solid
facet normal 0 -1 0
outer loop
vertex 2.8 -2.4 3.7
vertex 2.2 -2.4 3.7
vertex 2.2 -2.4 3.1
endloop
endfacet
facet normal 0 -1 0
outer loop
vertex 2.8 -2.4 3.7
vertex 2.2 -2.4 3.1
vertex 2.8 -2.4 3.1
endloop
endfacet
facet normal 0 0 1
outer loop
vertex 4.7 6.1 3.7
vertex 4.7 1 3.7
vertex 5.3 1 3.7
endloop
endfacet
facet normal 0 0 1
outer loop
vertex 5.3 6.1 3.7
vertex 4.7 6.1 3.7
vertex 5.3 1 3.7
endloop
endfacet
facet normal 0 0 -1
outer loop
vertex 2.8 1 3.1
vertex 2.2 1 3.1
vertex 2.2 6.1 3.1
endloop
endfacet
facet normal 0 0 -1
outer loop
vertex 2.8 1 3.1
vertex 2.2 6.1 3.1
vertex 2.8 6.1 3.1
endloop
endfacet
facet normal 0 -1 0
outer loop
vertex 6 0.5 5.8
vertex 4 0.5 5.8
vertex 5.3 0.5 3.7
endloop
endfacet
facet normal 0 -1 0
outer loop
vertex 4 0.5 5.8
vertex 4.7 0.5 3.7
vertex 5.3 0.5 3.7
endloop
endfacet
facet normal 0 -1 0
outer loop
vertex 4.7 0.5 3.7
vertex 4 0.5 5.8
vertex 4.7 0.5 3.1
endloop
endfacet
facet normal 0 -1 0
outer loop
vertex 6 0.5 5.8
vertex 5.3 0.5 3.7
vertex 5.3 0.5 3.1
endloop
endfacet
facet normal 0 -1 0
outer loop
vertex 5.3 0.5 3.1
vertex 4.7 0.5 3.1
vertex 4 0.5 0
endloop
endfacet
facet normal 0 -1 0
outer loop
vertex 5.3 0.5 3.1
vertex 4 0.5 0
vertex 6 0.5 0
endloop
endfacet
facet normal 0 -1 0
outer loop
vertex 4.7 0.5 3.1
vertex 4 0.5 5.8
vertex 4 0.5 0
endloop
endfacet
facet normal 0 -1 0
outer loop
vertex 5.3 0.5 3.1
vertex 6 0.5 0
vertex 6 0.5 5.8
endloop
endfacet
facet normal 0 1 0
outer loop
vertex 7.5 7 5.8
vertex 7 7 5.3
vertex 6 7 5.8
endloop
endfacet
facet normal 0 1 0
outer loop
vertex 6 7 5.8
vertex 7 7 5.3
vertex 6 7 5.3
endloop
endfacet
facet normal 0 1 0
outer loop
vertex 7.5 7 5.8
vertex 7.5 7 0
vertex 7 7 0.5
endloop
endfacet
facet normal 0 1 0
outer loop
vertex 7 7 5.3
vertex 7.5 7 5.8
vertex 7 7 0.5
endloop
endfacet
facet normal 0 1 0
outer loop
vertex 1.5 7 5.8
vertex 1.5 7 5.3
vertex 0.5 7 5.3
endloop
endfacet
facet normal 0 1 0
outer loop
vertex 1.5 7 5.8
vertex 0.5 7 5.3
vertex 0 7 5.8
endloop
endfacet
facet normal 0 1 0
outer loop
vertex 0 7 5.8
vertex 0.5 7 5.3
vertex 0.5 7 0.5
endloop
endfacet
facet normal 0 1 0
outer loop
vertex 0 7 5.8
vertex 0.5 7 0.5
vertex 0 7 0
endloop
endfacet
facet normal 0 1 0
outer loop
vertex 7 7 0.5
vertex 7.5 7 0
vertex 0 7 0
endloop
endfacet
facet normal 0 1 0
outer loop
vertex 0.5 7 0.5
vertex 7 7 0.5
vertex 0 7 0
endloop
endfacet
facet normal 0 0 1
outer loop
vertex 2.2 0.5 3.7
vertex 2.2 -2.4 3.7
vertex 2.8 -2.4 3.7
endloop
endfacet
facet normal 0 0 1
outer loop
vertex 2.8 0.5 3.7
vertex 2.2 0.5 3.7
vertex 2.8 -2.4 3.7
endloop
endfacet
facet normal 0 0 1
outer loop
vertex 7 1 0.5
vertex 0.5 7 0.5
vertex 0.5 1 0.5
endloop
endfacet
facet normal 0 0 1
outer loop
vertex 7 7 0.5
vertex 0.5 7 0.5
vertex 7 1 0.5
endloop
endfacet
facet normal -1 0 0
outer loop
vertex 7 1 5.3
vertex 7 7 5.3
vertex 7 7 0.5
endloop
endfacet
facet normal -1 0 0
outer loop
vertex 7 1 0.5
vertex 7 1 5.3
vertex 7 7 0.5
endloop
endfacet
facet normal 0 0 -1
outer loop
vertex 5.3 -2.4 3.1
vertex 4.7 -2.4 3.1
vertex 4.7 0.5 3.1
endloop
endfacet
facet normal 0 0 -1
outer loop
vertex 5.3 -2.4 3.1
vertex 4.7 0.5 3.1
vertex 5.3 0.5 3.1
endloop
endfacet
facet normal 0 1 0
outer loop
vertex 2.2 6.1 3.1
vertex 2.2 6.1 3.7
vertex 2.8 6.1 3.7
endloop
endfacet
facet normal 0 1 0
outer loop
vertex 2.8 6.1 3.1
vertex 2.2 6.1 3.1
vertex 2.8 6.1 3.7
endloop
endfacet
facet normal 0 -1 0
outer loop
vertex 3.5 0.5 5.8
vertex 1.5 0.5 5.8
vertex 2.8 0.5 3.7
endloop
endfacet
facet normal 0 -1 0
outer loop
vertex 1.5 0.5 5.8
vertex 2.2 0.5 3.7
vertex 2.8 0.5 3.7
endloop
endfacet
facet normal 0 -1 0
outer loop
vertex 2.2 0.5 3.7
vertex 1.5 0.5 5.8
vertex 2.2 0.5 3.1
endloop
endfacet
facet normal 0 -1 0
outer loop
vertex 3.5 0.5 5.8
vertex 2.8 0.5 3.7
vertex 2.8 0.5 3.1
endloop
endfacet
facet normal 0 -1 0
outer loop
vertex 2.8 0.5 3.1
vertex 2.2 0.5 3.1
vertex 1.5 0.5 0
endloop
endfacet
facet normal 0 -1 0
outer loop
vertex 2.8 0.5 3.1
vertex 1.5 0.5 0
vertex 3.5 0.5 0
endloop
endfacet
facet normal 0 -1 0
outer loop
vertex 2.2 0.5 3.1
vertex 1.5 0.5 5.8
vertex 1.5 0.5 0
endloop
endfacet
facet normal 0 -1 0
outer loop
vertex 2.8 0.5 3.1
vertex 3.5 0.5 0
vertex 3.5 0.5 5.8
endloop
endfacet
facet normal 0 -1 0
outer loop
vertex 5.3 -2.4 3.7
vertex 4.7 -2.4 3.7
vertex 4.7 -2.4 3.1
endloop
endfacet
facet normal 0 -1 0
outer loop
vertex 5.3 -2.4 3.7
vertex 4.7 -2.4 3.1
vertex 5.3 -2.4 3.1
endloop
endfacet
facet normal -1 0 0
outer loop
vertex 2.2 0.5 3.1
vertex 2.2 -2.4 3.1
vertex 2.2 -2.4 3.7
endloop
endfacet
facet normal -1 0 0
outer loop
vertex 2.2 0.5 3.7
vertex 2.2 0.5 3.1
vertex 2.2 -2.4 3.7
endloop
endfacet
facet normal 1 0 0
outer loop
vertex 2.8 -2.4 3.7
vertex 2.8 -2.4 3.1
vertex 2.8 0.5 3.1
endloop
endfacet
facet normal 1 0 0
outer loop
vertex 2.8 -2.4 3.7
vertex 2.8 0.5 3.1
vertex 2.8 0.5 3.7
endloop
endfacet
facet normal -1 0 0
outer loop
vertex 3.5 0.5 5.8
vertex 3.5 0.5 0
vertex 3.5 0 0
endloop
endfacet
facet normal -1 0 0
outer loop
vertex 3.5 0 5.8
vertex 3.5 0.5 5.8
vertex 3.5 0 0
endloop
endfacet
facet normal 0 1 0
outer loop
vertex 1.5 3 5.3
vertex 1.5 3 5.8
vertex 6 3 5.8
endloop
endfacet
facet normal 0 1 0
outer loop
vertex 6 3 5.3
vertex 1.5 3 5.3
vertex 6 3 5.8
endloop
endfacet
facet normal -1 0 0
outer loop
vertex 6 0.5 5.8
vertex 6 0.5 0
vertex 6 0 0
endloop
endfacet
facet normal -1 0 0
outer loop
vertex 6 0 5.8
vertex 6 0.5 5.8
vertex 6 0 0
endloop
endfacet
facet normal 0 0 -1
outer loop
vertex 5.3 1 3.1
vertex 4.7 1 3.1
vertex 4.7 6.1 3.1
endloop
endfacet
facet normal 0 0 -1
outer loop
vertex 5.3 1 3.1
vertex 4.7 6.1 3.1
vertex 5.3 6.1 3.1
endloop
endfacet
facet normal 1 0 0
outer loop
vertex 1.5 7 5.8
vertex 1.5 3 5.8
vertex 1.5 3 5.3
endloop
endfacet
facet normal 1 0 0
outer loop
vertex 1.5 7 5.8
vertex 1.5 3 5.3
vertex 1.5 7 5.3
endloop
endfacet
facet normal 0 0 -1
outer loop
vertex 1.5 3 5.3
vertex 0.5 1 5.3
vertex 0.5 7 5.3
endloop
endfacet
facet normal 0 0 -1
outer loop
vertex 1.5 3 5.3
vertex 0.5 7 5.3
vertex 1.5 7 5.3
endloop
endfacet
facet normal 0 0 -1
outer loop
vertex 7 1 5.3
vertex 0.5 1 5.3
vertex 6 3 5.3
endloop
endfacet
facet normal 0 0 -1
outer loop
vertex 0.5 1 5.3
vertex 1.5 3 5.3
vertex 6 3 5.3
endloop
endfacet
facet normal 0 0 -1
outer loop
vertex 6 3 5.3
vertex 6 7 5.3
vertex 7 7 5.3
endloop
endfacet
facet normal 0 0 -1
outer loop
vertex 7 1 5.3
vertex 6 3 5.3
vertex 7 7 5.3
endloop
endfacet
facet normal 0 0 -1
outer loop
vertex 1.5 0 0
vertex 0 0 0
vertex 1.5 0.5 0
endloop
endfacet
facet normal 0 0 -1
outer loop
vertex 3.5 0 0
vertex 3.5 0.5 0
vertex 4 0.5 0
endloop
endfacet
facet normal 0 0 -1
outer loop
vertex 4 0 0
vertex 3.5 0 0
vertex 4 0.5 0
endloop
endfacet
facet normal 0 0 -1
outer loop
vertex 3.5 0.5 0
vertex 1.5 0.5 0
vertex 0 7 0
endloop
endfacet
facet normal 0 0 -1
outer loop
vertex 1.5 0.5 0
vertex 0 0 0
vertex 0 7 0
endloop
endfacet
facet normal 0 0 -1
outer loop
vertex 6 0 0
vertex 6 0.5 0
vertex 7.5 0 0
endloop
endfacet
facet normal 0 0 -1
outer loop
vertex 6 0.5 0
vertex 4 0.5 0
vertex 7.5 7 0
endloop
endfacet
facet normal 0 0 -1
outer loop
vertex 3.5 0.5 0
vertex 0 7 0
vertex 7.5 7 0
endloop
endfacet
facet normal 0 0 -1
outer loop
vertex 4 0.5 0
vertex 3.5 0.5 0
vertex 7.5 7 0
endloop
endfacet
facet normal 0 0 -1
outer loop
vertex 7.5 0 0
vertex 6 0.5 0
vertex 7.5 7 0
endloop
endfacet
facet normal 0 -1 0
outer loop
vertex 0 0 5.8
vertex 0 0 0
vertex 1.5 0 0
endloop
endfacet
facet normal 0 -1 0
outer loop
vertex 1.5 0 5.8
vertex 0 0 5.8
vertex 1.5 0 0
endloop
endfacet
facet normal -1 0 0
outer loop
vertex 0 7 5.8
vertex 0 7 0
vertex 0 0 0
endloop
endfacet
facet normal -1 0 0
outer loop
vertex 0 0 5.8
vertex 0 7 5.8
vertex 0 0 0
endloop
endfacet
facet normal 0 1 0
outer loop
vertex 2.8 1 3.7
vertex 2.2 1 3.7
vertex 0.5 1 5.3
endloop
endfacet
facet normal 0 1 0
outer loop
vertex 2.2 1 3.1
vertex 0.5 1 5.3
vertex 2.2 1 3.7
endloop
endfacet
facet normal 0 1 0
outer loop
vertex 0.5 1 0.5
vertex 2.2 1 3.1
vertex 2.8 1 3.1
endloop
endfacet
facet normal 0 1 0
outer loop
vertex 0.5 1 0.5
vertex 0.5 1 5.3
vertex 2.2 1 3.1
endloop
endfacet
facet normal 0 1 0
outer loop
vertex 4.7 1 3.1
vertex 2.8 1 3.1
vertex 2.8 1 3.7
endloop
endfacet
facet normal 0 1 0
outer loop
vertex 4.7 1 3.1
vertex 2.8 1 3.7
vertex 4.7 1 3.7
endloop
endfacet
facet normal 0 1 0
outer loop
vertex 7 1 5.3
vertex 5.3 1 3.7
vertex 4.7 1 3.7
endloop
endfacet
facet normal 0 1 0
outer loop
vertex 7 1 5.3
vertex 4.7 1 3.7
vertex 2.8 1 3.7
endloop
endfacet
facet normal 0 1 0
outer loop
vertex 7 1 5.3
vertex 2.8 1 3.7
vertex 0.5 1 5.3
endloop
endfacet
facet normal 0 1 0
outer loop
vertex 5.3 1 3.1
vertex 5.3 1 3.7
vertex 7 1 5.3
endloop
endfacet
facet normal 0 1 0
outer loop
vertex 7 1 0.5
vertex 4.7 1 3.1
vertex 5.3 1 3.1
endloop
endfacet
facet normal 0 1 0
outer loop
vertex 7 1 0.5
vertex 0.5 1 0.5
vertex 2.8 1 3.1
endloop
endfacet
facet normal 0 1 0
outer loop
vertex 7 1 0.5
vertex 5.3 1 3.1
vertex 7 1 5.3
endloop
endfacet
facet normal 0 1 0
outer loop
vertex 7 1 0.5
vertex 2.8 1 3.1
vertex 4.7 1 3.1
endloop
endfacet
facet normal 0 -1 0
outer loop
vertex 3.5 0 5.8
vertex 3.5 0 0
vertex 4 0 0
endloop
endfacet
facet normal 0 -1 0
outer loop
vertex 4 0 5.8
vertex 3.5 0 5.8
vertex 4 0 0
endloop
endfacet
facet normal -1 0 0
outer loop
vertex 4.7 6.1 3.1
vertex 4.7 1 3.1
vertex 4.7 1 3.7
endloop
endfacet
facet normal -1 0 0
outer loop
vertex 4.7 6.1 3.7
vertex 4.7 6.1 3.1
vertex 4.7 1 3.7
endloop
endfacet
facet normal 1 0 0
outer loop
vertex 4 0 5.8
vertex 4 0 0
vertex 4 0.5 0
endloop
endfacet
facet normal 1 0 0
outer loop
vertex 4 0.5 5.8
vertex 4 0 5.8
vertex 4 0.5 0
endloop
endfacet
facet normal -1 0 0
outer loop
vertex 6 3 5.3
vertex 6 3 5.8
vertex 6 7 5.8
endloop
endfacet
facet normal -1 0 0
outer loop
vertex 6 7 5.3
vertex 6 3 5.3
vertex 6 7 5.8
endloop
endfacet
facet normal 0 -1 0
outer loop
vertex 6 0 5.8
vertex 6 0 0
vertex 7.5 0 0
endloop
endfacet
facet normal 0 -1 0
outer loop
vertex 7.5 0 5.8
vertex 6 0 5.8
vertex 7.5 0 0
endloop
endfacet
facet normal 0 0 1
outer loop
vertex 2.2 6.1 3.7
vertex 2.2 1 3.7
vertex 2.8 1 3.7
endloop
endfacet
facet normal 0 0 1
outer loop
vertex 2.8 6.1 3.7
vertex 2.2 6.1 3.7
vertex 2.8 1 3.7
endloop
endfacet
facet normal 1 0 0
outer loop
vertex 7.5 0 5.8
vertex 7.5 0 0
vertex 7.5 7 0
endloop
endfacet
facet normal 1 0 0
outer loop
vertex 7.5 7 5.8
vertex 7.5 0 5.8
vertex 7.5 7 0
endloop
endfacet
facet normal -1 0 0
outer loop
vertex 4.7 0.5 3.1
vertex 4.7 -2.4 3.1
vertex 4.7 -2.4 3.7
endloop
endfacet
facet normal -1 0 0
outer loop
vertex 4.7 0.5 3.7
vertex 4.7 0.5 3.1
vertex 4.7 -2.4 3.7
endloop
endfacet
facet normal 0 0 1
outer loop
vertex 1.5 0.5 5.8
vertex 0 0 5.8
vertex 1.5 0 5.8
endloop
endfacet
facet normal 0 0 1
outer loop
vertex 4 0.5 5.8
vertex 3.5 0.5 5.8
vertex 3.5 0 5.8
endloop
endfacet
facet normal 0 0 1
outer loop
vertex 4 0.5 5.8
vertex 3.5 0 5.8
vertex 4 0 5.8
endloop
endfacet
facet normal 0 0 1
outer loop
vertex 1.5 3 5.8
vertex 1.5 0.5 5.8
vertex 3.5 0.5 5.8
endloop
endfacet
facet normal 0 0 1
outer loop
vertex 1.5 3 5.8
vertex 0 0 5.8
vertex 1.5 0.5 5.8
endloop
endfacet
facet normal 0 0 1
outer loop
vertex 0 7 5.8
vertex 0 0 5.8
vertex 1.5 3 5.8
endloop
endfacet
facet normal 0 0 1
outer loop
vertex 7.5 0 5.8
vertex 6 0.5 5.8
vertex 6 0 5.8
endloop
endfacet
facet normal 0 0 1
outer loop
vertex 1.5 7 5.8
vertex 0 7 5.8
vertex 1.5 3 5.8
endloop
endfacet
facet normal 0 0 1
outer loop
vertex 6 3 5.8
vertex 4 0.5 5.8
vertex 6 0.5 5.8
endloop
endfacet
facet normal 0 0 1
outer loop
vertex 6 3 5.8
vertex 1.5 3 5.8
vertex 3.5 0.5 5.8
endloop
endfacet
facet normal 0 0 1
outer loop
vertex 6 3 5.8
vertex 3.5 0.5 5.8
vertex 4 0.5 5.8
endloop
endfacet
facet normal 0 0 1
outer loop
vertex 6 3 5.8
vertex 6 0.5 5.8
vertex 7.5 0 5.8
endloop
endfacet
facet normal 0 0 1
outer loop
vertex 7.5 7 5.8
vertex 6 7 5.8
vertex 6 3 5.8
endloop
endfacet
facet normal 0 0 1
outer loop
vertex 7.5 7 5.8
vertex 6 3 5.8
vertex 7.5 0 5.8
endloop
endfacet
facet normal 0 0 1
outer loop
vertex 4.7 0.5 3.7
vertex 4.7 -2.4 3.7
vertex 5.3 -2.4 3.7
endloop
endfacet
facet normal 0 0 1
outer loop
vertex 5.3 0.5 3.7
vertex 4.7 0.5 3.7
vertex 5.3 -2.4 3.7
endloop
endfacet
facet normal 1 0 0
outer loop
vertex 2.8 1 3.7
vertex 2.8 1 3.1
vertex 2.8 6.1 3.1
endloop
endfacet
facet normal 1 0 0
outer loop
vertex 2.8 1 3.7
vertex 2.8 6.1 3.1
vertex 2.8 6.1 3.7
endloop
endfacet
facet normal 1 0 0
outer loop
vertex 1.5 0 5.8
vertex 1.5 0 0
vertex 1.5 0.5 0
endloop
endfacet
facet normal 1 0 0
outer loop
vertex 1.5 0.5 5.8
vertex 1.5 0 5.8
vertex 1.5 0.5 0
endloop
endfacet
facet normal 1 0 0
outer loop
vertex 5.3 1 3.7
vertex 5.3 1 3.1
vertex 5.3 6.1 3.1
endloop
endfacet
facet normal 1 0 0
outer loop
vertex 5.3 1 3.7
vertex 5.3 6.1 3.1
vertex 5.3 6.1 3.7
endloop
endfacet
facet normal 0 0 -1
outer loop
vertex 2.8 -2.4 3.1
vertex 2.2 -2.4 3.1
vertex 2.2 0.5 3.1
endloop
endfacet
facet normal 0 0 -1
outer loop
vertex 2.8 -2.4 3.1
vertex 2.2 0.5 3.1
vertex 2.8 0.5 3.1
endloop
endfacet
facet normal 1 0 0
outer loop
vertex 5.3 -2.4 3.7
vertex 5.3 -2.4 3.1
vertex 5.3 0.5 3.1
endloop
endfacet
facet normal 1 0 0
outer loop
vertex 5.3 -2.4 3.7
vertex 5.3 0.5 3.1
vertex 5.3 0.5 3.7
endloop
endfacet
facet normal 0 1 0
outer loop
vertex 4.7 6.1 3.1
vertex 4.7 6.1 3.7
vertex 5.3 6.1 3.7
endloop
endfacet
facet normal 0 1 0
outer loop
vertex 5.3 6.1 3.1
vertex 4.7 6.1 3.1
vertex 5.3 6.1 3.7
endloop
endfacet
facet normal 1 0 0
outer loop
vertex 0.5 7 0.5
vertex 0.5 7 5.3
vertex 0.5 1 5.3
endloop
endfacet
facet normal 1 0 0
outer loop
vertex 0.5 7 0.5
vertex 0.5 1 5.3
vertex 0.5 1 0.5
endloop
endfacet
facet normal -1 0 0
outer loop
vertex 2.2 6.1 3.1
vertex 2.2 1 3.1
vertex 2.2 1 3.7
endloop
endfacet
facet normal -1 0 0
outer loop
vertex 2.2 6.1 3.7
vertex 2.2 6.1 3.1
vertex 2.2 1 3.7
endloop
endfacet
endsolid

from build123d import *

# Parameters (mm, degrees)
EXTRUDE_1_DEPTH      = 5.8
SKETCH_2_W           = 6.5
SKETCH_2_H           = 4.8
CUT_EXTRUDE_1_DEPTH  = 6
SKETCH_3_W           = 0.6
SKETCH_3_H           = 0.6
EXTRUDE_2_DEPTH      = 2.4
EXTRUDE_2_DEPTH_BACK = 6.1
SKETCH_5_W           = 4.5
SKETCH_5_H           = 4
CUT_EXTRUDE_2_DEPTH  = 1


with BuildPart() as part:
    # 草图1 → 凸台-拉伸1 (new body)
    with BuildSketch(Plane.XY):
        Polygon((1.5, 0), (1.5, 0.5), (3.5, 0.5), (3.5, 0), (4, 0), (4, 0.5), (6, 0.5), (6, 0), (7.5, 0), (7.5, 7), (0, 7), (0, 0), align=None)
    extrude(amount=EXTRUDE_1_DEPTH)

    # 草图2 → 切除-拉伸1 (cut)
    with BuildSketch(Plane(origin=(0, 7, 0), x_dir=(1, 0, 0), z_dir=(0, 1, 0))):
        with Locations((3.75, -2.9)):
            Rectangle(SKETCH_2_W, SKETCH_2_H)
    extrude(amount=-CUT_EXTRUDE_1_DEPTH, mode=Mode.SUBTRACT)

    # 草图3 → 凸台-拉伸2 (add, two sides)
    with BuildSketch(Plane.XZ) as extrude_2_sk:
        with Locations((2.5, 3.4)):
            Rectangle(SKETCH_3_W, SKETCH_3_H)
        with Locations((5, 3.4)):
            Rectangle(SKETCH_3_W, SKETCH_3_H)
    extrude(amount=EXTRUDE_2_DEPTH)
    extrude(extrude_2_sk.sketch, amount=-EXTRUDE_2_DEPTH_BACK)

    # 草图5 → 切除-拉伸2 (cut)
    with BuildSketch(Plane.XY.offset(5.8)):
        with Locations((3.75, 5)):
            Rectangle(SKETCH_5_W, SKETCH_5_H)
    extrude(amount=-CUT_EXTRUDE_2_DEPTH, mode=Mode.SUBTRACT)


solid = part.part
